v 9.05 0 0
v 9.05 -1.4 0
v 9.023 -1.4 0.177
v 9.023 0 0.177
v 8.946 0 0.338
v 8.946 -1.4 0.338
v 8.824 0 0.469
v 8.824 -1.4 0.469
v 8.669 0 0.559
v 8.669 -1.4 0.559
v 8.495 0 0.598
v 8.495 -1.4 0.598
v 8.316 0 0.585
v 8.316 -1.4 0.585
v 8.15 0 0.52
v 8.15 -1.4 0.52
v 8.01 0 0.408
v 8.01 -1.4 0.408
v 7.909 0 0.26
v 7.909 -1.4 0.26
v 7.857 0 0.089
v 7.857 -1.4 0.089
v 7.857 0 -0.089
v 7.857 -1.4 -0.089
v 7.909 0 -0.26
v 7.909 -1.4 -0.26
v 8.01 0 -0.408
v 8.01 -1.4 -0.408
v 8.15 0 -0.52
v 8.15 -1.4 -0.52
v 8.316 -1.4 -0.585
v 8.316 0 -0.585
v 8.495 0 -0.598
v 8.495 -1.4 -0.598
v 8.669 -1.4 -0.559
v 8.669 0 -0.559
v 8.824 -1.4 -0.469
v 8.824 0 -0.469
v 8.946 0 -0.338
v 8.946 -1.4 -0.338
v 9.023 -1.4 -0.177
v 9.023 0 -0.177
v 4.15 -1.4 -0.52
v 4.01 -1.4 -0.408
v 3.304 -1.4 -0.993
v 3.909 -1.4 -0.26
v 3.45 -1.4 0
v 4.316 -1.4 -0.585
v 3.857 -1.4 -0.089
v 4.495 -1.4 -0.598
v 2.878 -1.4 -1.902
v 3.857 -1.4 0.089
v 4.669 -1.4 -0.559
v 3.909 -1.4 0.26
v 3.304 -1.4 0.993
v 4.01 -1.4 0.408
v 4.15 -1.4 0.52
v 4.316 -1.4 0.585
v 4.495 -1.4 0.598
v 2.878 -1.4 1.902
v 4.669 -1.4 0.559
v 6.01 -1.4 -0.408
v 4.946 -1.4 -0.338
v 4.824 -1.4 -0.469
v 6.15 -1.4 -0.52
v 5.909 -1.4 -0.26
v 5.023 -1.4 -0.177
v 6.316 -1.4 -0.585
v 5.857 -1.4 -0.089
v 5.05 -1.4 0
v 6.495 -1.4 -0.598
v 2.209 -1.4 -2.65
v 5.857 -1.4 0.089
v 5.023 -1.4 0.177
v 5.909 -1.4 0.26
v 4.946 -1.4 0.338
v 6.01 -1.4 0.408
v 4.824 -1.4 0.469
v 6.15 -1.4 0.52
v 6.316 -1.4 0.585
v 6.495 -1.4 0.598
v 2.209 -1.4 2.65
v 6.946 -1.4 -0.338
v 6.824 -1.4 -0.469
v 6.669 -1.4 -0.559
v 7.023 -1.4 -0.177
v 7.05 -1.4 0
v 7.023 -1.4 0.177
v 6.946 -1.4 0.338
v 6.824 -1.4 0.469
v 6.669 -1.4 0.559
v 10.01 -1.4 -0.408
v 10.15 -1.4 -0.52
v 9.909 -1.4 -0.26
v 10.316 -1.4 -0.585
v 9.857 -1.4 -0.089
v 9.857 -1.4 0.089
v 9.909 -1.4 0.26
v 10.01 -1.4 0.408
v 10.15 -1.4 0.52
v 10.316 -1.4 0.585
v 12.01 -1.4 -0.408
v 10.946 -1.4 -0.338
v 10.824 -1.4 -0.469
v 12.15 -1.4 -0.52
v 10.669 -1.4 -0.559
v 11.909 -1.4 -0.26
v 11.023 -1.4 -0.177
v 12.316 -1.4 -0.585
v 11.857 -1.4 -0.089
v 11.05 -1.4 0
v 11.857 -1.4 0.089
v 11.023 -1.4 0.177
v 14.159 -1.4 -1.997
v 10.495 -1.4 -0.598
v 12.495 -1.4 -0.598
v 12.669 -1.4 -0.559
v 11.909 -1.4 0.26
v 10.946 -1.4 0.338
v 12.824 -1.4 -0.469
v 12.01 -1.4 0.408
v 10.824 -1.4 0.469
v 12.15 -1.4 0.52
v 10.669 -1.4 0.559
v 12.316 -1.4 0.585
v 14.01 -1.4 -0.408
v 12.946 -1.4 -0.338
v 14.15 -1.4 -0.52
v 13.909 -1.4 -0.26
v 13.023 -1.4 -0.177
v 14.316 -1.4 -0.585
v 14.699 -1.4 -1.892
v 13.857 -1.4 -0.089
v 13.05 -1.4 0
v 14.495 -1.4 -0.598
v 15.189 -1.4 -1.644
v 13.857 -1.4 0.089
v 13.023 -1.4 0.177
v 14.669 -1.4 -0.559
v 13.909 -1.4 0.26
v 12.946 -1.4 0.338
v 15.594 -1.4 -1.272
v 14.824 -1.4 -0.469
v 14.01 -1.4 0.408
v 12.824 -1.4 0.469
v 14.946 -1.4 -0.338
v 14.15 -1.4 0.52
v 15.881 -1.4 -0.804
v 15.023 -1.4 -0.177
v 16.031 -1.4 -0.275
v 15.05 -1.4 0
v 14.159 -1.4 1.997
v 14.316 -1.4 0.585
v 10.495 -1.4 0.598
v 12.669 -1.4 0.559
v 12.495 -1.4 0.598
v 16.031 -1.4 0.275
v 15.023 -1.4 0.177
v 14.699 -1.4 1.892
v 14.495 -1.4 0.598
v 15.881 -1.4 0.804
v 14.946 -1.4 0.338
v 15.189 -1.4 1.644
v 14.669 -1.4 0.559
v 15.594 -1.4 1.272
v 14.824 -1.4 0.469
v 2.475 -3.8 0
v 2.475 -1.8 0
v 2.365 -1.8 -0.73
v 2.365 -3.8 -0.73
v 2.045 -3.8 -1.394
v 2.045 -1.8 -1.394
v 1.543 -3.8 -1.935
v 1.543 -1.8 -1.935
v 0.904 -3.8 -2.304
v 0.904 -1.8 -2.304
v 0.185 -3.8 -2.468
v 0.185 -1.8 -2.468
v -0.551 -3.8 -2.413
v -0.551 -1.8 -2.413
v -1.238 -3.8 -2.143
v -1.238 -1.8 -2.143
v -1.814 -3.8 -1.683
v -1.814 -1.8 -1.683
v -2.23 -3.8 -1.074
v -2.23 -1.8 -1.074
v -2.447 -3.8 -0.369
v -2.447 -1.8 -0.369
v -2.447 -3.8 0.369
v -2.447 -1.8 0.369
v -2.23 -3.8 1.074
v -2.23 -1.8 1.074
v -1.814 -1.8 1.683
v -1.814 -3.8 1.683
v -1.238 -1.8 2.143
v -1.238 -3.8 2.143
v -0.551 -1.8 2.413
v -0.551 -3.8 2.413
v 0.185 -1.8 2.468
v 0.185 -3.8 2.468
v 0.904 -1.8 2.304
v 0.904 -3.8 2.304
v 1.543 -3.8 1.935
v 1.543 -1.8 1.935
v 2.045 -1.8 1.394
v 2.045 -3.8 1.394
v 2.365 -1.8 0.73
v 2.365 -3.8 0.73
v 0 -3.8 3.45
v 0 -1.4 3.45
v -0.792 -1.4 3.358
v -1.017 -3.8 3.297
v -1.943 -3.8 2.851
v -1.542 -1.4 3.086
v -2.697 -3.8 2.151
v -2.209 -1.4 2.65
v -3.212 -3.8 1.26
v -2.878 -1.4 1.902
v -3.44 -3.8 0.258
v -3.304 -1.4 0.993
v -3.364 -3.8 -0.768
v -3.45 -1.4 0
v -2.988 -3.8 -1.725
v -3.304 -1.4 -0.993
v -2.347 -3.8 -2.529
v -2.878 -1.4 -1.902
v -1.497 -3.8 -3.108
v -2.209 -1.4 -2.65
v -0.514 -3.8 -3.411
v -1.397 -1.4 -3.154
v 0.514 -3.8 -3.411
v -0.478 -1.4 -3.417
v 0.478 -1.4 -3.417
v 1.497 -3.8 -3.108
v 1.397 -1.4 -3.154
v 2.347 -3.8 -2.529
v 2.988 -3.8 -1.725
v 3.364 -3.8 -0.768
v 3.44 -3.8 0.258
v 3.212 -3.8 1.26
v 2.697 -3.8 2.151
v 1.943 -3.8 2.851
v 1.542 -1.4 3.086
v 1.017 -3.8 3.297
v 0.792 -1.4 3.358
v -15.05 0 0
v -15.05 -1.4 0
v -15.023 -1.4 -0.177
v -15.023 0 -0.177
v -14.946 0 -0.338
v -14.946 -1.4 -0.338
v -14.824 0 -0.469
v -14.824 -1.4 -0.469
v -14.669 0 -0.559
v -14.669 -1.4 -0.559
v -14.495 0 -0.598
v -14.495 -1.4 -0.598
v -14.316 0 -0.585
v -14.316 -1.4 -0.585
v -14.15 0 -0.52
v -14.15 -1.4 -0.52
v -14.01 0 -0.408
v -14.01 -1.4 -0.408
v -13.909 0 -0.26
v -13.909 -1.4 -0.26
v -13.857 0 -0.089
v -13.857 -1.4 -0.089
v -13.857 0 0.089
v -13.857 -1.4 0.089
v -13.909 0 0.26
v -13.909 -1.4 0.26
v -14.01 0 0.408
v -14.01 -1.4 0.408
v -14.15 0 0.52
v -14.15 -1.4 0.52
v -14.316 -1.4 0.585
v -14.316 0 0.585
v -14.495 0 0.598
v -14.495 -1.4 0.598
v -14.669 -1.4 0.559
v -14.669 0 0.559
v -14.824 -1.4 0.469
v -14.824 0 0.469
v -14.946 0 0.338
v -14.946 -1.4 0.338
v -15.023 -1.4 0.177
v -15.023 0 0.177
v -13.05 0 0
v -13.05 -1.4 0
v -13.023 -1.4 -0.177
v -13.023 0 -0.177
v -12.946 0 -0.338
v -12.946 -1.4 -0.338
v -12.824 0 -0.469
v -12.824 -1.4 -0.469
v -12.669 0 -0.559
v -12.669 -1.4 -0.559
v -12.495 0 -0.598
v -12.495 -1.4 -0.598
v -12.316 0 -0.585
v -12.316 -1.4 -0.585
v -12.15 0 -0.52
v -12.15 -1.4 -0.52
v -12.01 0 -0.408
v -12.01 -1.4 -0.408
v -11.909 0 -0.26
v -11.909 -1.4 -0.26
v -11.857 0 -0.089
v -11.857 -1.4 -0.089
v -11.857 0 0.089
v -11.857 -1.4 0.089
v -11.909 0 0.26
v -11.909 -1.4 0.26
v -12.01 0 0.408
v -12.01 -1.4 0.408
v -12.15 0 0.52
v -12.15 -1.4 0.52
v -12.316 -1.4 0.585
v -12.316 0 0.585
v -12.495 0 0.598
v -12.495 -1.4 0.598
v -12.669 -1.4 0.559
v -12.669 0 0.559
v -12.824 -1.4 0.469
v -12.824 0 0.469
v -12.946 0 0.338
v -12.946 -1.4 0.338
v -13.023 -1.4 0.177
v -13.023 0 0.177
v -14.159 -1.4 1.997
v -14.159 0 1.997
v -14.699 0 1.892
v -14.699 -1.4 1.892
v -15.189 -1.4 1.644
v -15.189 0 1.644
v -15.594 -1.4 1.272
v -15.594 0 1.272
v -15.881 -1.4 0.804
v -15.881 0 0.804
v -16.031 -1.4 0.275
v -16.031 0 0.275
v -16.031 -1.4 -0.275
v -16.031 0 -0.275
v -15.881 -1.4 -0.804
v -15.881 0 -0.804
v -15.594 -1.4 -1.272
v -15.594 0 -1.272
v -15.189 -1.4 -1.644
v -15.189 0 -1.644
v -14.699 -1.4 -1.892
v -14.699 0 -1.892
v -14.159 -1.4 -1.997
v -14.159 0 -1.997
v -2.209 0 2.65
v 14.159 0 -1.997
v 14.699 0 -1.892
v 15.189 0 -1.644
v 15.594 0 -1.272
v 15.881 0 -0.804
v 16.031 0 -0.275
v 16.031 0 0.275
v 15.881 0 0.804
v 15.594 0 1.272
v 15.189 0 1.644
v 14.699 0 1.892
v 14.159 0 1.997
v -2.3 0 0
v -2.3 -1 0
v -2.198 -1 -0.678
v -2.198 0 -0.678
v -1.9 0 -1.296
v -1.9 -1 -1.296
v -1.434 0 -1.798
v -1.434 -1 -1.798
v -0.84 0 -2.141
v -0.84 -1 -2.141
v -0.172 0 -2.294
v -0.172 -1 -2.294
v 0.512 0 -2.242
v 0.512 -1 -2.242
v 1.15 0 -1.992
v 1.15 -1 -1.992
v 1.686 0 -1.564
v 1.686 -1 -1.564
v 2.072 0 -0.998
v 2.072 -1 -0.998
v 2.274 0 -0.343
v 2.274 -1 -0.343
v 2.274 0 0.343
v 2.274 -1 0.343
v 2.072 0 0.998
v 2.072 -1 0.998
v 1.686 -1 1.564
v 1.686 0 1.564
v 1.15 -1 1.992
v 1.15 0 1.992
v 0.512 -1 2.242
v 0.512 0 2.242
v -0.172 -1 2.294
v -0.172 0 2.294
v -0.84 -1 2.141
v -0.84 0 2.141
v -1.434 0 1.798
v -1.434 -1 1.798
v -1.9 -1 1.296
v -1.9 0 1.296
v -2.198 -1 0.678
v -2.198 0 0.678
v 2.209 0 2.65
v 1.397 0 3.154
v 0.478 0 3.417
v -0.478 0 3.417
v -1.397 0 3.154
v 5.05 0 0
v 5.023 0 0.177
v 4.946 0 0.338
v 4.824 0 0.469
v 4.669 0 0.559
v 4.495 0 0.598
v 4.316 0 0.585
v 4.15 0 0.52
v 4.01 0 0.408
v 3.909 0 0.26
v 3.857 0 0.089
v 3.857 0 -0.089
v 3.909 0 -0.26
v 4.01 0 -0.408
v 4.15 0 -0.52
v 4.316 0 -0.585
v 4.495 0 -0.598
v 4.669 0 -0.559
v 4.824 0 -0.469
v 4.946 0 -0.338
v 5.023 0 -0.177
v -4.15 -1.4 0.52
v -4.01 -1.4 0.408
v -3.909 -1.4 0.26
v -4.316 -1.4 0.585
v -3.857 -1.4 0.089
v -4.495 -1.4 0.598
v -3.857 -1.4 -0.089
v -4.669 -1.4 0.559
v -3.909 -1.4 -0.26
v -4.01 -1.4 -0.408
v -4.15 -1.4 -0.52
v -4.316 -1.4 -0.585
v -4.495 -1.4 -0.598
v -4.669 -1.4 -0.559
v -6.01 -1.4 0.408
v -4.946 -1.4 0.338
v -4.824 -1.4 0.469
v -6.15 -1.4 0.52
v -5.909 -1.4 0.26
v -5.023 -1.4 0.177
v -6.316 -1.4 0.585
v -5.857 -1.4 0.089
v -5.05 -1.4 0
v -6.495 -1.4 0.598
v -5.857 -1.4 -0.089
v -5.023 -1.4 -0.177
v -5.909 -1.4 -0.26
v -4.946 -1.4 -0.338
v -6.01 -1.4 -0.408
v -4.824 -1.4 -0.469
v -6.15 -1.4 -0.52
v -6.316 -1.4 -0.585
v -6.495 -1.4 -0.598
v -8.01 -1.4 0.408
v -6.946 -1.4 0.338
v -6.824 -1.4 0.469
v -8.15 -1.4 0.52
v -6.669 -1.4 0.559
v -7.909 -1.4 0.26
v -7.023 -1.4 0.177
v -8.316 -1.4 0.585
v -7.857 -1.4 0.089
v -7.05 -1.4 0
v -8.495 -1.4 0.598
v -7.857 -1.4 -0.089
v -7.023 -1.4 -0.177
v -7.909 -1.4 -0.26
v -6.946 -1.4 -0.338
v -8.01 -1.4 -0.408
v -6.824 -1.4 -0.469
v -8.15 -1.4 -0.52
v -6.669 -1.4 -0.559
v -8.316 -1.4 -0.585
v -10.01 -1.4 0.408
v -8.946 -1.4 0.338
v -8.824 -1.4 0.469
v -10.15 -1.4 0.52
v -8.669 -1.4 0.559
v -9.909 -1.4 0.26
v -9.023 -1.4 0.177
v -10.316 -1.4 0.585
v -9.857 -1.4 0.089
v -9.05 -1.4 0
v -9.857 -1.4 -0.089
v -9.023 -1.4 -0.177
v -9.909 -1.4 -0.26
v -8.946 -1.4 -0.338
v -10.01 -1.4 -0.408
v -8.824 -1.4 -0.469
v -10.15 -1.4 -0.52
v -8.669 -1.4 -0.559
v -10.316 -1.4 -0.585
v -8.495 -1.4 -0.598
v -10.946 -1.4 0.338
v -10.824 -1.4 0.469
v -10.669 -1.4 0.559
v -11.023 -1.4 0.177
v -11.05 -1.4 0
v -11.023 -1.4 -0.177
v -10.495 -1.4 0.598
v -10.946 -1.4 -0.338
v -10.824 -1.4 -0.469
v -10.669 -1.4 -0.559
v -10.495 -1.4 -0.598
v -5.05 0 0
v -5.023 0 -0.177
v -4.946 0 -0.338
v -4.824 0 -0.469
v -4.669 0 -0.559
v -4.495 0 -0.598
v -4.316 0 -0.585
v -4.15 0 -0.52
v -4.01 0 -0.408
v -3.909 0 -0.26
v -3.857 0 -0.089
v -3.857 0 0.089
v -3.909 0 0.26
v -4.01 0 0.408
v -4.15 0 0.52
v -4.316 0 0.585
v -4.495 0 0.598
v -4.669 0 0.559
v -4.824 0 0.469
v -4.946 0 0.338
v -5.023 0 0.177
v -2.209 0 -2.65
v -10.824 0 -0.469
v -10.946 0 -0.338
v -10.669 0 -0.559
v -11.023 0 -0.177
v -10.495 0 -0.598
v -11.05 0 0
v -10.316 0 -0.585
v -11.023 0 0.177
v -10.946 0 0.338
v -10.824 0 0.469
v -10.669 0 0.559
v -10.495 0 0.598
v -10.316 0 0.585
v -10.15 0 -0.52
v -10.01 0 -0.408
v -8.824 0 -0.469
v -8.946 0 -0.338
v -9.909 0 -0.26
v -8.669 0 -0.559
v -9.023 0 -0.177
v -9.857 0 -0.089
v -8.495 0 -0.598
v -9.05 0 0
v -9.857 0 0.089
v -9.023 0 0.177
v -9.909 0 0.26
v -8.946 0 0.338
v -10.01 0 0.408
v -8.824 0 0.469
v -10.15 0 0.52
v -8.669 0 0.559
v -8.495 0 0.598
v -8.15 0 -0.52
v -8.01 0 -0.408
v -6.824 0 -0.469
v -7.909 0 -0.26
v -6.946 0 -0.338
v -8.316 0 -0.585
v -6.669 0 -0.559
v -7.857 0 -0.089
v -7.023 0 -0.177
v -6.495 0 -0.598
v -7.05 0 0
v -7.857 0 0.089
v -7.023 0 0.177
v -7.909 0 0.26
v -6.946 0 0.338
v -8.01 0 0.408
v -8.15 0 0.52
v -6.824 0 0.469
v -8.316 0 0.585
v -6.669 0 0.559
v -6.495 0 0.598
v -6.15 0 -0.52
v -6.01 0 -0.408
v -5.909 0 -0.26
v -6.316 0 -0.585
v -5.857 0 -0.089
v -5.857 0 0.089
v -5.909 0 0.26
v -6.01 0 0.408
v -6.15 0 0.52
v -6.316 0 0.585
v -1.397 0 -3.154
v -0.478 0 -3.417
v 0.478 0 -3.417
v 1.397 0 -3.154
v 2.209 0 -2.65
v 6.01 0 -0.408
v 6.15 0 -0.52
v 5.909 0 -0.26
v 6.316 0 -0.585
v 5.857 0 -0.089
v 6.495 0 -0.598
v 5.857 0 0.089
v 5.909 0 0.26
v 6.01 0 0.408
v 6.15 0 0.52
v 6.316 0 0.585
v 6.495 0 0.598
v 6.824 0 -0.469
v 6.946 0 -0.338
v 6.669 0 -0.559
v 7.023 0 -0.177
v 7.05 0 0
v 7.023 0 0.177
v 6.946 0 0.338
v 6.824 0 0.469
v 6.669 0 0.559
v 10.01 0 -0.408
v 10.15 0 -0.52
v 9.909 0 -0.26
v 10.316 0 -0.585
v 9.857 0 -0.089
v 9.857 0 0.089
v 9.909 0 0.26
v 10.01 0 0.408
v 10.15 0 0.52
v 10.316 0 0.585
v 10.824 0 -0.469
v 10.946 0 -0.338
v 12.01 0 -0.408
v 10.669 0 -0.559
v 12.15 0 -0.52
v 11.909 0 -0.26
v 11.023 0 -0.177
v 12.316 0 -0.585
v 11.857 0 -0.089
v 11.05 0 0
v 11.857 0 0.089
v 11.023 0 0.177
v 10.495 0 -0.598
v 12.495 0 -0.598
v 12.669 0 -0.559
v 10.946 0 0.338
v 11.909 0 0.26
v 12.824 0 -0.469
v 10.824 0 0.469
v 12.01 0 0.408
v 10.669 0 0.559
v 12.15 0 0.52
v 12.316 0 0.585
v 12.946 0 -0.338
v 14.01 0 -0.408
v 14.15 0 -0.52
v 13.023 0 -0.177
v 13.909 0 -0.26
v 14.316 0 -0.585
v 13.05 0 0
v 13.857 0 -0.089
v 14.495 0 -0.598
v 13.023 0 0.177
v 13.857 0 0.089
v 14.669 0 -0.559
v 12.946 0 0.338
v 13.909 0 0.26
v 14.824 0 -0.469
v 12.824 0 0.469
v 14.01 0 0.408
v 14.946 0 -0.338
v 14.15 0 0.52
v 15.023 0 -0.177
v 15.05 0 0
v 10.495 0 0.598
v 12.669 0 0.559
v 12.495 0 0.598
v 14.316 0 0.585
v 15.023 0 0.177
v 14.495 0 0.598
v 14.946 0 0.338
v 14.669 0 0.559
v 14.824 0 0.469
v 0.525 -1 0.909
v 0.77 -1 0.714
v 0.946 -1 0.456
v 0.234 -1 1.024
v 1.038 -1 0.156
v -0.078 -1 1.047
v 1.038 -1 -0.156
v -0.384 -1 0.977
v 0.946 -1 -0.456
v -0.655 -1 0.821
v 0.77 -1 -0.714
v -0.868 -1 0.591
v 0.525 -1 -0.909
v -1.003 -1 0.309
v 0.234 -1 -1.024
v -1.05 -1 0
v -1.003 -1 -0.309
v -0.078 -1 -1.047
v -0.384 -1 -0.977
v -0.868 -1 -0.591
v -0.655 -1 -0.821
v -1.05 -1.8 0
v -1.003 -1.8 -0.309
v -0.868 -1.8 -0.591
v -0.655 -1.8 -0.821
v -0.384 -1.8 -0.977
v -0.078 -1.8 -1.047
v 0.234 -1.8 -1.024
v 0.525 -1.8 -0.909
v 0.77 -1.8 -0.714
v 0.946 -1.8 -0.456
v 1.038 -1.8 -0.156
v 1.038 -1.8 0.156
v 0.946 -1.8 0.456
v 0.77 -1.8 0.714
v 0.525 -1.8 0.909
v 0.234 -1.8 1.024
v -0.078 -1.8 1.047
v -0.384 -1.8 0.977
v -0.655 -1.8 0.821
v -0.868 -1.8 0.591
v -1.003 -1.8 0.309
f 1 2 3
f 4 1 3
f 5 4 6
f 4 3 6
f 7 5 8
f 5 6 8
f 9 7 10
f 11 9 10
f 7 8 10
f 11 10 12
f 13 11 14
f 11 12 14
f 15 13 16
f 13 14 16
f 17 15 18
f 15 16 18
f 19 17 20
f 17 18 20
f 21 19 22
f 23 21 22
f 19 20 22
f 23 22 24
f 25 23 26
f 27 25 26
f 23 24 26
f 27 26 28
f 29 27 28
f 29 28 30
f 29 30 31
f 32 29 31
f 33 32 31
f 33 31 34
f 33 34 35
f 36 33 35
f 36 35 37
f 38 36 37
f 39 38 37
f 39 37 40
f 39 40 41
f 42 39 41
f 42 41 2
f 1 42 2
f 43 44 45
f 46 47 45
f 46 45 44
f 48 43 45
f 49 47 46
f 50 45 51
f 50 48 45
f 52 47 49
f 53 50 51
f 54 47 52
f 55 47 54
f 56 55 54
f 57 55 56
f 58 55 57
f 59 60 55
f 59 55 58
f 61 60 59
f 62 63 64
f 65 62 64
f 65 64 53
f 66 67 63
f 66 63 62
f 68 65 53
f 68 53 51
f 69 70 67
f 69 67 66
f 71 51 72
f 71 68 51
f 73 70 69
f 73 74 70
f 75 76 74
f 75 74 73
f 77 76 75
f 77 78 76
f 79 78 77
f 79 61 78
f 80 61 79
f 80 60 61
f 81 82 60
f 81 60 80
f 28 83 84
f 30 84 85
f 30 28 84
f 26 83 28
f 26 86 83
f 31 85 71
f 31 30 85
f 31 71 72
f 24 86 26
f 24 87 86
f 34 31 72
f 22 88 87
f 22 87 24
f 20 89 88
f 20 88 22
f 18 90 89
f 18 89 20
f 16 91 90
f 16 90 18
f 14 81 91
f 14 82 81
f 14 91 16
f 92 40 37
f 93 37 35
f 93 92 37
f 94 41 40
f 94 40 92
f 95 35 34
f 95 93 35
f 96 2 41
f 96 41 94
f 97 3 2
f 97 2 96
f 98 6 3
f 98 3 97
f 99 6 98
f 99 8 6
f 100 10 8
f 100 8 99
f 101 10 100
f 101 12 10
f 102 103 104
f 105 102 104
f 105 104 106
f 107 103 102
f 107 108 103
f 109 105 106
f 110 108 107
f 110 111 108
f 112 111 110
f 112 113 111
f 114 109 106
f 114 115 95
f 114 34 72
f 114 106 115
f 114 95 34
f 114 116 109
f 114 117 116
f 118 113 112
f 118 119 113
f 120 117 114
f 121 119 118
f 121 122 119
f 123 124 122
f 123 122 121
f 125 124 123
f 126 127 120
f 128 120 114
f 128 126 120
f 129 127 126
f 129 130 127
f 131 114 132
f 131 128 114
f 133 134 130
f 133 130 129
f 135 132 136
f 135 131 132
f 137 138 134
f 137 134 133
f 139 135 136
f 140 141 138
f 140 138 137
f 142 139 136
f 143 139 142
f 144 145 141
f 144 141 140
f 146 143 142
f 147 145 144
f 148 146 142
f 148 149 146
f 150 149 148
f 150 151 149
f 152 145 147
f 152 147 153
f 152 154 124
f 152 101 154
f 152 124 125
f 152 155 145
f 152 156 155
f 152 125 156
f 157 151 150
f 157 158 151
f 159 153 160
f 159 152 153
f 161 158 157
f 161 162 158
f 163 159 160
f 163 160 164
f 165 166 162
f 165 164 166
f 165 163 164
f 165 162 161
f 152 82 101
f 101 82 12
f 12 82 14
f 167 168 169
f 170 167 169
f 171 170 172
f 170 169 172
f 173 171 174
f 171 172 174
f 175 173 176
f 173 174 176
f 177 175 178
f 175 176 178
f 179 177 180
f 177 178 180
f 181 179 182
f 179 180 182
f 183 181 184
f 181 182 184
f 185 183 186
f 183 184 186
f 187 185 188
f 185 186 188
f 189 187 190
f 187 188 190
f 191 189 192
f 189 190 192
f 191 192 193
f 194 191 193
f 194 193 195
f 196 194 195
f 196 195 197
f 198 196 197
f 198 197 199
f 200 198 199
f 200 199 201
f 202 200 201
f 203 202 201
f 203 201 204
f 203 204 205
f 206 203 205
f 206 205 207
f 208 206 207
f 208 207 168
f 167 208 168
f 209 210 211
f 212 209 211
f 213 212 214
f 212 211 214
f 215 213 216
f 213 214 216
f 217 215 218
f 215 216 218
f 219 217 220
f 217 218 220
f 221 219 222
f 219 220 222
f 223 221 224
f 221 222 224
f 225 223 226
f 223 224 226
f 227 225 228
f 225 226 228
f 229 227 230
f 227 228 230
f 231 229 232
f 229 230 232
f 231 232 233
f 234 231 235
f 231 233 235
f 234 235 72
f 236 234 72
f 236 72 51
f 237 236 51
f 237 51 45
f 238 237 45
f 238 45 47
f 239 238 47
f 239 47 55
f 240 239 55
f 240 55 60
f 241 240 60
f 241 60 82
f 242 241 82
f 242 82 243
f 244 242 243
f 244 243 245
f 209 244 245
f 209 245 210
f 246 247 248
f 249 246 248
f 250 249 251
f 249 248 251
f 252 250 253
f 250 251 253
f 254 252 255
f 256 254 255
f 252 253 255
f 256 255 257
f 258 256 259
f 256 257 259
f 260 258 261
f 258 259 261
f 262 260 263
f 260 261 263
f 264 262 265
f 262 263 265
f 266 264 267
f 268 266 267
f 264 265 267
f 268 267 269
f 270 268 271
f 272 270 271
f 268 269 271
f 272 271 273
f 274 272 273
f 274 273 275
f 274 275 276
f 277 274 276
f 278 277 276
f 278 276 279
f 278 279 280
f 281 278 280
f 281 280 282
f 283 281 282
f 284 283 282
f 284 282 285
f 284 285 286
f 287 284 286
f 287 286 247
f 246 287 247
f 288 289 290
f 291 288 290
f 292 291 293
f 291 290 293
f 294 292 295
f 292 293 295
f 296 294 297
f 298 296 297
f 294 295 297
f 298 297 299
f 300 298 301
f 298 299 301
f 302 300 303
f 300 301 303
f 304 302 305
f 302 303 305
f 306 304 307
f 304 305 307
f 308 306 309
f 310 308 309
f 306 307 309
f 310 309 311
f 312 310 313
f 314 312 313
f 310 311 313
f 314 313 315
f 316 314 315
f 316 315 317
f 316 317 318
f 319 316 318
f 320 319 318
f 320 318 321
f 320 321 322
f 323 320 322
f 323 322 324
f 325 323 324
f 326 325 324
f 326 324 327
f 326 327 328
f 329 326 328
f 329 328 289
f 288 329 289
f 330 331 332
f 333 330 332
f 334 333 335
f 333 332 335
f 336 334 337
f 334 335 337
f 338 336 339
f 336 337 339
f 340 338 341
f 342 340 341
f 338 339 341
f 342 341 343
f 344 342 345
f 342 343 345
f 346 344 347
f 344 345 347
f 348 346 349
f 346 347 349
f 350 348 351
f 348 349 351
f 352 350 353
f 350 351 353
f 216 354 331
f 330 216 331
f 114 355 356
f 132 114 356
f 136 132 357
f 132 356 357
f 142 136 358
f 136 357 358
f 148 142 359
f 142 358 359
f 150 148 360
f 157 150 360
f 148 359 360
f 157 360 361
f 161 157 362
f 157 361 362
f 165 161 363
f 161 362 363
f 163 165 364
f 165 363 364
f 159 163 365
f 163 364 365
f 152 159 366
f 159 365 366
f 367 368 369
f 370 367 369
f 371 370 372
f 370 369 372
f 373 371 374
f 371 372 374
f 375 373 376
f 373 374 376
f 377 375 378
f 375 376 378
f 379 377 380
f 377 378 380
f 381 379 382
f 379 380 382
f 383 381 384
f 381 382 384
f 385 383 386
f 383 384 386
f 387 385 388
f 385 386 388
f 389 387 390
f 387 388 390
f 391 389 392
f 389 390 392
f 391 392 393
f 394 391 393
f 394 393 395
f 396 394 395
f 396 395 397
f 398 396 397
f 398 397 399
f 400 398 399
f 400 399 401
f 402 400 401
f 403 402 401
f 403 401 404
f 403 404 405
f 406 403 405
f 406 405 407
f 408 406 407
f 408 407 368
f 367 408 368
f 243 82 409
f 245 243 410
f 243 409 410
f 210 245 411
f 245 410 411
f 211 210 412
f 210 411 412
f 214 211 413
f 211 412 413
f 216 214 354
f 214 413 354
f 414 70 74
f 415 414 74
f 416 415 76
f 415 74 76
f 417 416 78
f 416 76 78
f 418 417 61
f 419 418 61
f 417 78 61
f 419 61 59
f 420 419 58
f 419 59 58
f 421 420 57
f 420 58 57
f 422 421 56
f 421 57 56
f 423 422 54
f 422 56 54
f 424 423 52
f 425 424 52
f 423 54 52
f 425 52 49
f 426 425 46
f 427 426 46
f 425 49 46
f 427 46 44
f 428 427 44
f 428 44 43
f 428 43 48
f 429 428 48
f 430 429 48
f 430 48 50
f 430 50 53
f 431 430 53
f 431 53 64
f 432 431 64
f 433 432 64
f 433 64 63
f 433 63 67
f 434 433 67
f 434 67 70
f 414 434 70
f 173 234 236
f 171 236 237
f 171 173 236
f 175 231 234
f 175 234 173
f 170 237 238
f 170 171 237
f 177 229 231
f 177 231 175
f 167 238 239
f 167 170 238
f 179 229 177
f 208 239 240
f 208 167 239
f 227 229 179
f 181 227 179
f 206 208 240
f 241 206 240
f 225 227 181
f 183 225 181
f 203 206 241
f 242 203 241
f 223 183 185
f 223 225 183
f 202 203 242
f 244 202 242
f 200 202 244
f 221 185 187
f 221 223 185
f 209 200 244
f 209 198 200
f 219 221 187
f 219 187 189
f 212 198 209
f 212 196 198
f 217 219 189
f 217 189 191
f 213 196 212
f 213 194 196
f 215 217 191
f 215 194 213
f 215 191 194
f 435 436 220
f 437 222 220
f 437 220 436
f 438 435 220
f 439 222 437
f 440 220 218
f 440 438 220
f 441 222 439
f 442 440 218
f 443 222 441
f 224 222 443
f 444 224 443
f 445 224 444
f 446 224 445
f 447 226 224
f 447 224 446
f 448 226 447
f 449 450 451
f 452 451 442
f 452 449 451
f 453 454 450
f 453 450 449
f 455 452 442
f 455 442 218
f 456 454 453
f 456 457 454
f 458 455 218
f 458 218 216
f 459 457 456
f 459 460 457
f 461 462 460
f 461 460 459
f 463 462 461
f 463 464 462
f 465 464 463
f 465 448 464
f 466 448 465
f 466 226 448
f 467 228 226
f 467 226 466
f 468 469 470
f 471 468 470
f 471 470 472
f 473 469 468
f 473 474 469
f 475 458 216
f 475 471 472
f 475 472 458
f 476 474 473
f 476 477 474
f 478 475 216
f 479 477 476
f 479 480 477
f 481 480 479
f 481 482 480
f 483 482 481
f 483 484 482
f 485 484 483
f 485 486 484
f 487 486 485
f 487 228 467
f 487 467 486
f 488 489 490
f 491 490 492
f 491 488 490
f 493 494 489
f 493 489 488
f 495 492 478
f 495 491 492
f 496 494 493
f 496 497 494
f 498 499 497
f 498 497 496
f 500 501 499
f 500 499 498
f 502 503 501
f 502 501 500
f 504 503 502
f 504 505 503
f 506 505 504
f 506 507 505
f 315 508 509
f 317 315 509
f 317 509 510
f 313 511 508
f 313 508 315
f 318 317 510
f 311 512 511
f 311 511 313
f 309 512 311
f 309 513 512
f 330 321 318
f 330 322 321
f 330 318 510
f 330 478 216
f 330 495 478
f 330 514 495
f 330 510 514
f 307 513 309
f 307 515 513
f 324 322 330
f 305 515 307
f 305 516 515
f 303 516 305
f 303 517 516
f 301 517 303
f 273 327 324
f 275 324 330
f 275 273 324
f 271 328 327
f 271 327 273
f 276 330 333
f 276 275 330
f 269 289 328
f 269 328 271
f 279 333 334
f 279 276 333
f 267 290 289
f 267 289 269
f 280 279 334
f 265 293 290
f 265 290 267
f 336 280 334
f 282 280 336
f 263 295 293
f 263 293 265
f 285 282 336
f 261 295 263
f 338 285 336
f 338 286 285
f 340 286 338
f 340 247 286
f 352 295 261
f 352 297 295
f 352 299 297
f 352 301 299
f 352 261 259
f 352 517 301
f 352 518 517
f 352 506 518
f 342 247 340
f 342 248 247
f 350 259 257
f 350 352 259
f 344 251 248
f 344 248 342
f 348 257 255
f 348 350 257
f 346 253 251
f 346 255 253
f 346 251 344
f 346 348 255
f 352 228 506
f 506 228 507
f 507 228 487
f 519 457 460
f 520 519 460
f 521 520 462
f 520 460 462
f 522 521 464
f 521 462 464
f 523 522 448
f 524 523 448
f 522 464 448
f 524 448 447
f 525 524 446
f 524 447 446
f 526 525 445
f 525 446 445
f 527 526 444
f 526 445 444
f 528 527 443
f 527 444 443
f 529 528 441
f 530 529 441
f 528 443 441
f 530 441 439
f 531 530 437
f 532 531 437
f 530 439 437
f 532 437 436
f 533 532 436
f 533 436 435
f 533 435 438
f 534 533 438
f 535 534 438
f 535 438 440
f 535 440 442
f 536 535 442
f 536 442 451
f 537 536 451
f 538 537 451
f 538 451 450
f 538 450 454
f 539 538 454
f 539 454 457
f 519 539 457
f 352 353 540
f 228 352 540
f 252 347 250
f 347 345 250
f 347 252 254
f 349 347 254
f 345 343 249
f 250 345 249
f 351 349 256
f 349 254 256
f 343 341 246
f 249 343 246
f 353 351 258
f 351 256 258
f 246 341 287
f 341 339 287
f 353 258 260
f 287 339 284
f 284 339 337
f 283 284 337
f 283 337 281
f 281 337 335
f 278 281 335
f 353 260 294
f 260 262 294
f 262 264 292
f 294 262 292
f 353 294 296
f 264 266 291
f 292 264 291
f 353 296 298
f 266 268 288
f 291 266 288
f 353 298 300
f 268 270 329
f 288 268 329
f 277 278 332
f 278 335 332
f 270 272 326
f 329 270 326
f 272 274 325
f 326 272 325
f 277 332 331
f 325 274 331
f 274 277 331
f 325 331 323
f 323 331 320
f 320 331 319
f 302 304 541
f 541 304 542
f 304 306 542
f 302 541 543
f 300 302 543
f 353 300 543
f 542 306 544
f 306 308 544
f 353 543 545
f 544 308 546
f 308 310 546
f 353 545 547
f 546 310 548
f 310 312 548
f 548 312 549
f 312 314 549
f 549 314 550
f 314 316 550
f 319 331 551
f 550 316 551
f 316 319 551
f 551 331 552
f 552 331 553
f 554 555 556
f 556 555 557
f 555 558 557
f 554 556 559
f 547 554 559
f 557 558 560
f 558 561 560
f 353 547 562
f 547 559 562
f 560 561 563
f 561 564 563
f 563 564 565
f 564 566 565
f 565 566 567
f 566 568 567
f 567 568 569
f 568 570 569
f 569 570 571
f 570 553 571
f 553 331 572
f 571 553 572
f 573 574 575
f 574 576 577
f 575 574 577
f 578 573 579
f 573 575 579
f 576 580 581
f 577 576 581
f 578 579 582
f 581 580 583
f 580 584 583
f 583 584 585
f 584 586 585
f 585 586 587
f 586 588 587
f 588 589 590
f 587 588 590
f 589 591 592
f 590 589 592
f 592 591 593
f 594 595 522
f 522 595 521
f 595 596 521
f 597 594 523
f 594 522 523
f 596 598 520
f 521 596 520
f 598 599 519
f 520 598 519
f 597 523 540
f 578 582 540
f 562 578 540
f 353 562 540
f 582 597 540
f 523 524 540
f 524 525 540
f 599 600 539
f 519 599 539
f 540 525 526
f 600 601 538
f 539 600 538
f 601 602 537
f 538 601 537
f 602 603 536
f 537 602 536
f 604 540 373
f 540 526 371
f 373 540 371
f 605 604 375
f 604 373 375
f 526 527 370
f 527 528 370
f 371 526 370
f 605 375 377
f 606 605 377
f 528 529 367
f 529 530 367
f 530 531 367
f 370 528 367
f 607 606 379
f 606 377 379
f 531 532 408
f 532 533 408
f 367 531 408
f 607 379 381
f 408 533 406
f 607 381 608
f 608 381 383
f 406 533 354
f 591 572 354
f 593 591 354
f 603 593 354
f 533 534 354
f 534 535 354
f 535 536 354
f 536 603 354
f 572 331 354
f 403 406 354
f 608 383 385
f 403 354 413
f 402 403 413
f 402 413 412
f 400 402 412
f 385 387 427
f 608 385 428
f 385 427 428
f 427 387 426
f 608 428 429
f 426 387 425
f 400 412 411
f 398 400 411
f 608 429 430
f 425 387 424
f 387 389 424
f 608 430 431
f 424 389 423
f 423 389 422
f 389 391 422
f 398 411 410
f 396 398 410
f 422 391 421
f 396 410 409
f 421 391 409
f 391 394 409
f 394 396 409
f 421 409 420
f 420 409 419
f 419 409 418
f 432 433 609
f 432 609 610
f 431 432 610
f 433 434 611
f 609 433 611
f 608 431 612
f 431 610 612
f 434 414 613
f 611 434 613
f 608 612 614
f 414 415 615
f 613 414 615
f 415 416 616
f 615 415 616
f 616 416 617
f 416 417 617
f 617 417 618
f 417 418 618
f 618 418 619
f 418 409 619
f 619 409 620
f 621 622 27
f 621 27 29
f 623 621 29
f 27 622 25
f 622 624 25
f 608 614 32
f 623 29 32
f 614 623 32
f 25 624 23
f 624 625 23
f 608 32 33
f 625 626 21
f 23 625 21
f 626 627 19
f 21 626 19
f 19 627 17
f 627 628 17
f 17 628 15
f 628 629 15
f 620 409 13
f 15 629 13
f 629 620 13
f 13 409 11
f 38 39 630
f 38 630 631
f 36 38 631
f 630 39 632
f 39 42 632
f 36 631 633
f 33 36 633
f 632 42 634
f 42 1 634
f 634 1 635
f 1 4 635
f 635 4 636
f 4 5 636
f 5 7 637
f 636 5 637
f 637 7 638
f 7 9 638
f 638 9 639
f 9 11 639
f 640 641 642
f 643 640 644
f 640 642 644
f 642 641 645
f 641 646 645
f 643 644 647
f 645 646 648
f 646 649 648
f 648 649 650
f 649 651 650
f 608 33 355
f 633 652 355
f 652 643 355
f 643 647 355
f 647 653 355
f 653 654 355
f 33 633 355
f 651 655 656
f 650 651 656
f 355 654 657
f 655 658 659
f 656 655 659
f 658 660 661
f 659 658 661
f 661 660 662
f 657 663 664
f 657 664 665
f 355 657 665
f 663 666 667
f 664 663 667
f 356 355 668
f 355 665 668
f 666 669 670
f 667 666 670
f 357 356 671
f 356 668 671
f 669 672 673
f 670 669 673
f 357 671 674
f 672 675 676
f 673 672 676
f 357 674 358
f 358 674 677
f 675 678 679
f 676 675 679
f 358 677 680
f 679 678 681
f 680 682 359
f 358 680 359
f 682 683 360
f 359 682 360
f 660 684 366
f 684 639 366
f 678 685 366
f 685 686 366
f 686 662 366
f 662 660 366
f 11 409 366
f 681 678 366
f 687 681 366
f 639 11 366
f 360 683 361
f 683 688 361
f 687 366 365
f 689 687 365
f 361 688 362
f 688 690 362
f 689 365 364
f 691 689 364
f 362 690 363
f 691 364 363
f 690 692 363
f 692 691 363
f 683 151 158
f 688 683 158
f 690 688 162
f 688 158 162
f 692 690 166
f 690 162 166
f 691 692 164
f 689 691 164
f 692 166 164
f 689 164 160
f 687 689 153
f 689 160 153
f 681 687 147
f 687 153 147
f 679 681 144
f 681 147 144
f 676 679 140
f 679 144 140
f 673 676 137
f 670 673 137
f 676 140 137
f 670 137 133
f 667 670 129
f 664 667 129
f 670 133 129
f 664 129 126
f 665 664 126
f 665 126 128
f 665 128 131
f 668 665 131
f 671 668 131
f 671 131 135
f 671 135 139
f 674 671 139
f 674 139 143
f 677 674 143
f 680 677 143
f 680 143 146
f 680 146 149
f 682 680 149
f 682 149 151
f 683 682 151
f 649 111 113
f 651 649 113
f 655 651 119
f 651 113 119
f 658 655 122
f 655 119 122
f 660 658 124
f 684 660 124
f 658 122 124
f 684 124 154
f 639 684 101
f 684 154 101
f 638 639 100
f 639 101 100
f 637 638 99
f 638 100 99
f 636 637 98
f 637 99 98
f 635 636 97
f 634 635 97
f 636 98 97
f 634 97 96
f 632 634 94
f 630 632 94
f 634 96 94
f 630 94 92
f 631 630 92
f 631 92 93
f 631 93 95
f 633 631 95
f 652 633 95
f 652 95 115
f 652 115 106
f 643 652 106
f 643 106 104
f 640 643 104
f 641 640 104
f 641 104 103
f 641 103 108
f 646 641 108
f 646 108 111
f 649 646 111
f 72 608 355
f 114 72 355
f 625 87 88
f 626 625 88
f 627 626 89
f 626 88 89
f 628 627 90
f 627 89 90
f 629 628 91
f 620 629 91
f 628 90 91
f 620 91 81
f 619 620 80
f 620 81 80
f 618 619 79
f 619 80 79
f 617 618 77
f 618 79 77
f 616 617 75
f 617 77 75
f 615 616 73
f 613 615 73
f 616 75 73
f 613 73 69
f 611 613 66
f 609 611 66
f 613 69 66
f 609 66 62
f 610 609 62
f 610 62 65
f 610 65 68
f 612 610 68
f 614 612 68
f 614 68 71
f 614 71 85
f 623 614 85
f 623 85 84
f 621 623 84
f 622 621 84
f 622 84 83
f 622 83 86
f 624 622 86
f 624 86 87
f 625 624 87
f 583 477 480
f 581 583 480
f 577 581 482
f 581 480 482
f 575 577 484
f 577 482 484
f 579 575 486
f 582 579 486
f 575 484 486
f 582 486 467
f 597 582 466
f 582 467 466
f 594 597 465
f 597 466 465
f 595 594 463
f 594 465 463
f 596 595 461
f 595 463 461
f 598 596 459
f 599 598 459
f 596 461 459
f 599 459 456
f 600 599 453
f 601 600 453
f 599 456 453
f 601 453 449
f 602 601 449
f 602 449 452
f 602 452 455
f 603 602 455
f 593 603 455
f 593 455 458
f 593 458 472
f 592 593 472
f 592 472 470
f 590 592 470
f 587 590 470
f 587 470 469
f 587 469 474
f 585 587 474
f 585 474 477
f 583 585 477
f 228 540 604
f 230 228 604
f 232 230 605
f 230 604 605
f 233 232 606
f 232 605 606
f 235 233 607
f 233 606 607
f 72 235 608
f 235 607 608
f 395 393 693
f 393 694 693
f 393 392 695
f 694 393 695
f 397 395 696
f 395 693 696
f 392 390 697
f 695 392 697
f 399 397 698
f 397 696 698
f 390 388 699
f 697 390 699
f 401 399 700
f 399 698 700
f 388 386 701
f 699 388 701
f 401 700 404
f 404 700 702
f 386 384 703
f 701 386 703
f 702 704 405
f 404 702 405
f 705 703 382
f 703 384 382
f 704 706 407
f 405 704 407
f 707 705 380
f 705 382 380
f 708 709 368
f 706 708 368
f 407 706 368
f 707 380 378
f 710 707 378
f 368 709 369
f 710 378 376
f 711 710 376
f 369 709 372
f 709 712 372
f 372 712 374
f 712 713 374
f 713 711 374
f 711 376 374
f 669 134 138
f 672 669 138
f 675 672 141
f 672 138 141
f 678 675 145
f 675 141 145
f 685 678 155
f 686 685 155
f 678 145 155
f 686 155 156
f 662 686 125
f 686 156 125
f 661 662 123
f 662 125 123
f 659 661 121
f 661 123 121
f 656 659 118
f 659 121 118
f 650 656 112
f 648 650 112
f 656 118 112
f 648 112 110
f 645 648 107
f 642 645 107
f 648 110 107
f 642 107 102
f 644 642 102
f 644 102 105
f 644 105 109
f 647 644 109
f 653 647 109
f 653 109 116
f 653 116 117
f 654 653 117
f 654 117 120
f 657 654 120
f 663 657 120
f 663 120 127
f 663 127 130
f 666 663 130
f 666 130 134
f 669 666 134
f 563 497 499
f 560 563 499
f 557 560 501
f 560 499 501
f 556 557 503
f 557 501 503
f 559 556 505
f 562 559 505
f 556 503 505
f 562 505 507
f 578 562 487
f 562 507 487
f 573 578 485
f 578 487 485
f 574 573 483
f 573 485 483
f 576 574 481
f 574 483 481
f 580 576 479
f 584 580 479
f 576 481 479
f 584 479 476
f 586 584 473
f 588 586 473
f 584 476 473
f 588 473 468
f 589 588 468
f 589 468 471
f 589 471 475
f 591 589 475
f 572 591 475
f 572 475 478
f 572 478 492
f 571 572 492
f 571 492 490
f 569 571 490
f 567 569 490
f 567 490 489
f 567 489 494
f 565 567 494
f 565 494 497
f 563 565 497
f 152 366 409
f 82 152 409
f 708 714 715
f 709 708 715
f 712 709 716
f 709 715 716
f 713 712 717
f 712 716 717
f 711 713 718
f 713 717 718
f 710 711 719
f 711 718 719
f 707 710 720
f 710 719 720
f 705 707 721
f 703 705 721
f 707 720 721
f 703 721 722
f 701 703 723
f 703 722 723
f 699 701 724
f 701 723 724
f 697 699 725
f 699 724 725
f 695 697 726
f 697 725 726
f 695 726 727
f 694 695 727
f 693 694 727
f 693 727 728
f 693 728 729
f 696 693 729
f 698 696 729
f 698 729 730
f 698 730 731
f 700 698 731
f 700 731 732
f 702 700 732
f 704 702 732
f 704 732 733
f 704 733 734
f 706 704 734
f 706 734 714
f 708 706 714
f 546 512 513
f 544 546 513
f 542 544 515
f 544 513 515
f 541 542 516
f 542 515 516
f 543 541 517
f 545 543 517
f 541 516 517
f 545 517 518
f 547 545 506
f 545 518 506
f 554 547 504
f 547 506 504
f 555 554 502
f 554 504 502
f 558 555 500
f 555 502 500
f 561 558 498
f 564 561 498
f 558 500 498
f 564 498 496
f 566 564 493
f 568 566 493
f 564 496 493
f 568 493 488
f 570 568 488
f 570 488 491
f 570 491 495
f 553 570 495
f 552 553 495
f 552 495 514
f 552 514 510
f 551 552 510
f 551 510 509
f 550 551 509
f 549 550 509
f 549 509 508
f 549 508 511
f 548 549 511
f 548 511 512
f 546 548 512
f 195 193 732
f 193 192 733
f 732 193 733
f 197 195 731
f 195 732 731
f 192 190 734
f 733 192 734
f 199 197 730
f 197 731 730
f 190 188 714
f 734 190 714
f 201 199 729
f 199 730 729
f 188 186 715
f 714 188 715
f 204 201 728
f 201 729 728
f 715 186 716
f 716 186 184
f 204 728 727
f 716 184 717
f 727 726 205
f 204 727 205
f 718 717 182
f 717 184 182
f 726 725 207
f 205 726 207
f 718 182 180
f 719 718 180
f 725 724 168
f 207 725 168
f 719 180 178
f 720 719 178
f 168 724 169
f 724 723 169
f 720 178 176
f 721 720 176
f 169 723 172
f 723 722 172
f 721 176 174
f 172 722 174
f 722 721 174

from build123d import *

# Parameters (mm, degrees)
RESSALTO_EXTRUS_O1_DEPTH = 1.4
ESBO_O2_R                = 3.45
RESSALTO_EXTRUS_O2_DEPTH = 2.4
FURO4_D                  = 1.2
PADR_O_LINEAR1_COUNT     = 6
PADR_O_LINEAR1_PITCH     = 2
PADR_OCIRCULAR2_COUNT    = 2
PADR_OCIRCULAR2_COPY_1_D = 1.2
PADR_OCIRCULAR2_COPY_2_D = 1.2
PADR_OCIRCULAR2_COPY_3_D = 1.2
PADR_OCIRCULAR2_COPY_4_D = 1.2
PADR_OCIRCULAR2_COPY_5_D = 1.2
FURO1_D                  = 4.95
FURO1_DEPTH              = 2
FURO2_D                  = 4.6
FURO2_DEPTH              = 1
FURO3_D                  = 2.1


with BuildPart() as part:
    # Esboço1 → Ressalto-extrusão1 (new body)
    with BuildSketch(Plane(origin=(0, 0, 0), x_dir=(1, 0, 0), z_dir=(0, 1, 0))):
        with BuildLine():
            Line((-14.159121967, 1.99702088), (-2.209072203, 2.65))
            ThreePointArc((-2.209072203, 2.65), (3.45, 0), (-2.209072203, -2.65))
            Line((-2.209072203, -2.65), (-14.159121967, -1.99702088))
            ThreePointArc((-14.159121967, -1.99702088), (-16.05, 0), (-14.159121967, 1.99702088))
        make_face()
    ressalto_extrus_o1 = extrude(amount=-RESSALTO_EXTRUS_O1_DEPTH)

    # Esboço2 → Ressalto-extrusão2 (add)
    with BuildSketch(Plane.XZ.offset(1.4)):
        with Locations(Location((0, 0, 0), (0, 0, 90))):
            Circle(ESBO_O2_R)
    extrude(amount=RESSALTO_EXTRUS_O2_DEPTH)

    # Furo4 (through all)
    with Locations(Plane(origin=(0, 0, 0), x_dir=(1, 0, 0), z_dir=(0, 1, 0))):
        with Locations((-14.45, 0)):
            furo4 = Hole(FURO4_D / 2)

    # Padrão linear1: Furo4 ×6
    with Locations(*[(i * PADR_O_LINEAR1_PITCH, 0, 0) for i in range(1, PADR_O_LINEAR1_COUNT)]):
        add(furo4, mode=Mode.SUBTRACT)

    # PadrãoCircular2: Ressalto-extrusão1, Furo4 ×2 about axis
    padr_ocircular2_axis = Axis((0, 0, 0), (0, 1, 0))
    add([ressalto_extrus_o1.rotate(padr_ocircular2_axis, i * 360 / PADR_OCIRCULAR2_COUNT) for i in range(1, PADR_OCIRCULAR2_COUNT)])
    add([furo4.rotate(padr_ocircular2_axis, i * 360 / PADR_OCIRCULAR2_COUNT) for i in range(1, PADR_OCIRCULAR2_COUNT)], mode=Mode.SUBTRACT)

    # PadrãoCircular2 copy 1 (through all)
    with Locations(Plane(origin=(-2, 0, 0), x_dir=(-1, 0, 0), z_dir=(0, 1, 0))):
        with Locations((-14.45, 0)):
            Hole(PADR_OCIRCULAR2_COPY_1_D / 2)

    # PadrãoCircular2 copy 2 (through all)
    with Locations(Plane(origin=(-4, 0, 0), x_dir=(-1, 0, 0), z_dir=(0, 1, 0))):
        with Locations((-14.45, 0)):
            Hole(PADR_OCIRCULAR2_COPY_2_D / 2)

    # PadrãoCircular2 copy 3 (through all)
    with Locations(Plane(origin=(-6, 0, 0), x_dir=(-1, 0, 0), z_dir=(0, 1, 0))):
        with Locations((-14.45, 0)):
            Hole(PADR_OCIRCULAR2_COPY_3_D / 2)

    # PadrãoCircular2 copy 4 (through all)
    with Locations(Plane(origin=(-8, 0, 0), x_dir=(-1, 0, 0), z_dir=(0, 1, 0))):
        with Locations((-14.45, 0)):
            Hole(PADR_OCIRCULAR2_COPY_4_D / 2)

    # PadrãoCircular2 copy 5 (through all)
    with Locations(Plane(origin=(-10, 0, 0), x_dir=(-1, 0, 0), z_dir=(0, 1, 0))):
        with Locations((-14.45, 0)):
            Hole(PADR_OCIRCULAR2_COPY_5_D / 2)

    # Furo1
    with Locations(Plane(origin=(0, -3.8, 0), x_dir=(-1, 0, 0), z_dir=(0, -1, 0))):
        with Locations((0, 0)):
            Hole(FURO1_D / 2, depth=FURO1_DEPTH)

    # Furo2
    with Locations(Plane(origin=(0, 0, 0), x_dir=(1, 0, 0), z_dir=(0, 1, 0))):
        with Locations((0, 0)):
            Hole(FURO2_D / 2, depth=FURO2_DEPTH)

    # Furo3 (through all)
    with Locations(Plane(origin=(0, 0, 0), x_dir=(1, 0, 0), z_dir=(0, 1, 0))):
        with Locations((0, 0)):
            Hole(FURO3_D / 2)


solid = part.part
